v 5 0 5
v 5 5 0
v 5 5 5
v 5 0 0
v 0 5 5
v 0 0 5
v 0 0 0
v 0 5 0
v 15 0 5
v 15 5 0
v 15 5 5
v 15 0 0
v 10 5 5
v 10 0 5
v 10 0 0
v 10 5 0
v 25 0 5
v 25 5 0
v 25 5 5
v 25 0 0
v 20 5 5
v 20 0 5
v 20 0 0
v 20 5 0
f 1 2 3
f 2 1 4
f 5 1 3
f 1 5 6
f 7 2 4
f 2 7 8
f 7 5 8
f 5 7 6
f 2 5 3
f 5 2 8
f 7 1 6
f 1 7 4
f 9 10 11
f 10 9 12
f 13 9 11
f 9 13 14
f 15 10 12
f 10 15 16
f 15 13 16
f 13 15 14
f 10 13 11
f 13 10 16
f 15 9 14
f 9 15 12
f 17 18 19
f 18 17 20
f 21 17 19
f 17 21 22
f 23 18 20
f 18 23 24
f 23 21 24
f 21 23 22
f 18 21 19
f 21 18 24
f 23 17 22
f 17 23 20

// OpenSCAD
color("red") cube(5);
translate([10,0,0]) color("blue") cube(5);
translate([20,0,0]) color("green") cube(5);
